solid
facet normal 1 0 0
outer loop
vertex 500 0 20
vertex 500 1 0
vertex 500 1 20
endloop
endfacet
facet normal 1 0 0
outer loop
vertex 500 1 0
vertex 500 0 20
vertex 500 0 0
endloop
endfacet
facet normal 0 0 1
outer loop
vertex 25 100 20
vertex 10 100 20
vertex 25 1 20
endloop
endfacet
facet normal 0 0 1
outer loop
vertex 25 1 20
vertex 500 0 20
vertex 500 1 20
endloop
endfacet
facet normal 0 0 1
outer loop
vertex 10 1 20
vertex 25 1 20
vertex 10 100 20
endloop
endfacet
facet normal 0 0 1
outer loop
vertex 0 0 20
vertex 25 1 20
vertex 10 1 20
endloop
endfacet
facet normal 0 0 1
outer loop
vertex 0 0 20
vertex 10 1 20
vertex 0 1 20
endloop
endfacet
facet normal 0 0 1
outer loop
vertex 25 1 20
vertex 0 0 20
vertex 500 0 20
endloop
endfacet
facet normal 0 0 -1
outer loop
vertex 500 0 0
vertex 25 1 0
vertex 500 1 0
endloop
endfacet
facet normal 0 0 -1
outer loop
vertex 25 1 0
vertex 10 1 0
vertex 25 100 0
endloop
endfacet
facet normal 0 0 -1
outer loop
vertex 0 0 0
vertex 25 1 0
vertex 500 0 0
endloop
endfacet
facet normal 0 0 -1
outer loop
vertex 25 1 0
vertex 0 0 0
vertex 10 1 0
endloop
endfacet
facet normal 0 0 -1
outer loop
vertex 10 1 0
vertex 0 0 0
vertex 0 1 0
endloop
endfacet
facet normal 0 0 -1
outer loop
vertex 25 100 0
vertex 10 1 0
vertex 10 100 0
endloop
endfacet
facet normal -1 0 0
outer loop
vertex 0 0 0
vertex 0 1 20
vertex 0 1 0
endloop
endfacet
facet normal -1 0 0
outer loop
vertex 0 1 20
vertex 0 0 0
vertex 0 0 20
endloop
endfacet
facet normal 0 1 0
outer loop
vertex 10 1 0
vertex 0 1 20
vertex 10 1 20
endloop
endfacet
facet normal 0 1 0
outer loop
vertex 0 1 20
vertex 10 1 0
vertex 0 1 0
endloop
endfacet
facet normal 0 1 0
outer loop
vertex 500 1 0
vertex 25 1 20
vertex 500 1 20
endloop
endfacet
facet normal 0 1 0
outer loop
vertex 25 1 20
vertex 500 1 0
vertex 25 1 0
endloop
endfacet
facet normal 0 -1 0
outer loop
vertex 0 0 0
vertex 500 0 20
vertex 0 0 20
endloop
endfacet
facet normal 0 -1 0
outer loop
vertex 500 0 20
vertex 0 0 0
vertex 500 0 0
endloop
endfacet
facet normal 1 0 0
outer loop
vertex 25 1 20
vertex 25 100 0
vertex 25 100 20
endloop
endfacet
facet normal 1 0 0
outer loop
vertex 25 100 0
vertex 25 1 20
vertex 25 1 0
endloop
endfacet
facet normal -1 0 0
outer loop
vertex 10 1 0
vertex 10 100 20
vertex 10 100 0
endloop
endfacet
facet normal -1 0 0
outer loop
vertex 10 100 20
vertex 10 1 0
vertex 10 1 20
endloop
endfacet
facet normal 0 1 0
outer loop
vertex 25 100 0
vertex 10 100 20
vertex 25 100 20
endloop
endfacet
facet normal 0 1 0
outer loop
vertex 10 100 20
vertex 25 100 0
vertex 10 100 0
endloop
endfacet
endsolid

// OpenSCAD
cube([500, 1, 20]);
 translate([10,0,0]) cube([15, 100, 20]);
